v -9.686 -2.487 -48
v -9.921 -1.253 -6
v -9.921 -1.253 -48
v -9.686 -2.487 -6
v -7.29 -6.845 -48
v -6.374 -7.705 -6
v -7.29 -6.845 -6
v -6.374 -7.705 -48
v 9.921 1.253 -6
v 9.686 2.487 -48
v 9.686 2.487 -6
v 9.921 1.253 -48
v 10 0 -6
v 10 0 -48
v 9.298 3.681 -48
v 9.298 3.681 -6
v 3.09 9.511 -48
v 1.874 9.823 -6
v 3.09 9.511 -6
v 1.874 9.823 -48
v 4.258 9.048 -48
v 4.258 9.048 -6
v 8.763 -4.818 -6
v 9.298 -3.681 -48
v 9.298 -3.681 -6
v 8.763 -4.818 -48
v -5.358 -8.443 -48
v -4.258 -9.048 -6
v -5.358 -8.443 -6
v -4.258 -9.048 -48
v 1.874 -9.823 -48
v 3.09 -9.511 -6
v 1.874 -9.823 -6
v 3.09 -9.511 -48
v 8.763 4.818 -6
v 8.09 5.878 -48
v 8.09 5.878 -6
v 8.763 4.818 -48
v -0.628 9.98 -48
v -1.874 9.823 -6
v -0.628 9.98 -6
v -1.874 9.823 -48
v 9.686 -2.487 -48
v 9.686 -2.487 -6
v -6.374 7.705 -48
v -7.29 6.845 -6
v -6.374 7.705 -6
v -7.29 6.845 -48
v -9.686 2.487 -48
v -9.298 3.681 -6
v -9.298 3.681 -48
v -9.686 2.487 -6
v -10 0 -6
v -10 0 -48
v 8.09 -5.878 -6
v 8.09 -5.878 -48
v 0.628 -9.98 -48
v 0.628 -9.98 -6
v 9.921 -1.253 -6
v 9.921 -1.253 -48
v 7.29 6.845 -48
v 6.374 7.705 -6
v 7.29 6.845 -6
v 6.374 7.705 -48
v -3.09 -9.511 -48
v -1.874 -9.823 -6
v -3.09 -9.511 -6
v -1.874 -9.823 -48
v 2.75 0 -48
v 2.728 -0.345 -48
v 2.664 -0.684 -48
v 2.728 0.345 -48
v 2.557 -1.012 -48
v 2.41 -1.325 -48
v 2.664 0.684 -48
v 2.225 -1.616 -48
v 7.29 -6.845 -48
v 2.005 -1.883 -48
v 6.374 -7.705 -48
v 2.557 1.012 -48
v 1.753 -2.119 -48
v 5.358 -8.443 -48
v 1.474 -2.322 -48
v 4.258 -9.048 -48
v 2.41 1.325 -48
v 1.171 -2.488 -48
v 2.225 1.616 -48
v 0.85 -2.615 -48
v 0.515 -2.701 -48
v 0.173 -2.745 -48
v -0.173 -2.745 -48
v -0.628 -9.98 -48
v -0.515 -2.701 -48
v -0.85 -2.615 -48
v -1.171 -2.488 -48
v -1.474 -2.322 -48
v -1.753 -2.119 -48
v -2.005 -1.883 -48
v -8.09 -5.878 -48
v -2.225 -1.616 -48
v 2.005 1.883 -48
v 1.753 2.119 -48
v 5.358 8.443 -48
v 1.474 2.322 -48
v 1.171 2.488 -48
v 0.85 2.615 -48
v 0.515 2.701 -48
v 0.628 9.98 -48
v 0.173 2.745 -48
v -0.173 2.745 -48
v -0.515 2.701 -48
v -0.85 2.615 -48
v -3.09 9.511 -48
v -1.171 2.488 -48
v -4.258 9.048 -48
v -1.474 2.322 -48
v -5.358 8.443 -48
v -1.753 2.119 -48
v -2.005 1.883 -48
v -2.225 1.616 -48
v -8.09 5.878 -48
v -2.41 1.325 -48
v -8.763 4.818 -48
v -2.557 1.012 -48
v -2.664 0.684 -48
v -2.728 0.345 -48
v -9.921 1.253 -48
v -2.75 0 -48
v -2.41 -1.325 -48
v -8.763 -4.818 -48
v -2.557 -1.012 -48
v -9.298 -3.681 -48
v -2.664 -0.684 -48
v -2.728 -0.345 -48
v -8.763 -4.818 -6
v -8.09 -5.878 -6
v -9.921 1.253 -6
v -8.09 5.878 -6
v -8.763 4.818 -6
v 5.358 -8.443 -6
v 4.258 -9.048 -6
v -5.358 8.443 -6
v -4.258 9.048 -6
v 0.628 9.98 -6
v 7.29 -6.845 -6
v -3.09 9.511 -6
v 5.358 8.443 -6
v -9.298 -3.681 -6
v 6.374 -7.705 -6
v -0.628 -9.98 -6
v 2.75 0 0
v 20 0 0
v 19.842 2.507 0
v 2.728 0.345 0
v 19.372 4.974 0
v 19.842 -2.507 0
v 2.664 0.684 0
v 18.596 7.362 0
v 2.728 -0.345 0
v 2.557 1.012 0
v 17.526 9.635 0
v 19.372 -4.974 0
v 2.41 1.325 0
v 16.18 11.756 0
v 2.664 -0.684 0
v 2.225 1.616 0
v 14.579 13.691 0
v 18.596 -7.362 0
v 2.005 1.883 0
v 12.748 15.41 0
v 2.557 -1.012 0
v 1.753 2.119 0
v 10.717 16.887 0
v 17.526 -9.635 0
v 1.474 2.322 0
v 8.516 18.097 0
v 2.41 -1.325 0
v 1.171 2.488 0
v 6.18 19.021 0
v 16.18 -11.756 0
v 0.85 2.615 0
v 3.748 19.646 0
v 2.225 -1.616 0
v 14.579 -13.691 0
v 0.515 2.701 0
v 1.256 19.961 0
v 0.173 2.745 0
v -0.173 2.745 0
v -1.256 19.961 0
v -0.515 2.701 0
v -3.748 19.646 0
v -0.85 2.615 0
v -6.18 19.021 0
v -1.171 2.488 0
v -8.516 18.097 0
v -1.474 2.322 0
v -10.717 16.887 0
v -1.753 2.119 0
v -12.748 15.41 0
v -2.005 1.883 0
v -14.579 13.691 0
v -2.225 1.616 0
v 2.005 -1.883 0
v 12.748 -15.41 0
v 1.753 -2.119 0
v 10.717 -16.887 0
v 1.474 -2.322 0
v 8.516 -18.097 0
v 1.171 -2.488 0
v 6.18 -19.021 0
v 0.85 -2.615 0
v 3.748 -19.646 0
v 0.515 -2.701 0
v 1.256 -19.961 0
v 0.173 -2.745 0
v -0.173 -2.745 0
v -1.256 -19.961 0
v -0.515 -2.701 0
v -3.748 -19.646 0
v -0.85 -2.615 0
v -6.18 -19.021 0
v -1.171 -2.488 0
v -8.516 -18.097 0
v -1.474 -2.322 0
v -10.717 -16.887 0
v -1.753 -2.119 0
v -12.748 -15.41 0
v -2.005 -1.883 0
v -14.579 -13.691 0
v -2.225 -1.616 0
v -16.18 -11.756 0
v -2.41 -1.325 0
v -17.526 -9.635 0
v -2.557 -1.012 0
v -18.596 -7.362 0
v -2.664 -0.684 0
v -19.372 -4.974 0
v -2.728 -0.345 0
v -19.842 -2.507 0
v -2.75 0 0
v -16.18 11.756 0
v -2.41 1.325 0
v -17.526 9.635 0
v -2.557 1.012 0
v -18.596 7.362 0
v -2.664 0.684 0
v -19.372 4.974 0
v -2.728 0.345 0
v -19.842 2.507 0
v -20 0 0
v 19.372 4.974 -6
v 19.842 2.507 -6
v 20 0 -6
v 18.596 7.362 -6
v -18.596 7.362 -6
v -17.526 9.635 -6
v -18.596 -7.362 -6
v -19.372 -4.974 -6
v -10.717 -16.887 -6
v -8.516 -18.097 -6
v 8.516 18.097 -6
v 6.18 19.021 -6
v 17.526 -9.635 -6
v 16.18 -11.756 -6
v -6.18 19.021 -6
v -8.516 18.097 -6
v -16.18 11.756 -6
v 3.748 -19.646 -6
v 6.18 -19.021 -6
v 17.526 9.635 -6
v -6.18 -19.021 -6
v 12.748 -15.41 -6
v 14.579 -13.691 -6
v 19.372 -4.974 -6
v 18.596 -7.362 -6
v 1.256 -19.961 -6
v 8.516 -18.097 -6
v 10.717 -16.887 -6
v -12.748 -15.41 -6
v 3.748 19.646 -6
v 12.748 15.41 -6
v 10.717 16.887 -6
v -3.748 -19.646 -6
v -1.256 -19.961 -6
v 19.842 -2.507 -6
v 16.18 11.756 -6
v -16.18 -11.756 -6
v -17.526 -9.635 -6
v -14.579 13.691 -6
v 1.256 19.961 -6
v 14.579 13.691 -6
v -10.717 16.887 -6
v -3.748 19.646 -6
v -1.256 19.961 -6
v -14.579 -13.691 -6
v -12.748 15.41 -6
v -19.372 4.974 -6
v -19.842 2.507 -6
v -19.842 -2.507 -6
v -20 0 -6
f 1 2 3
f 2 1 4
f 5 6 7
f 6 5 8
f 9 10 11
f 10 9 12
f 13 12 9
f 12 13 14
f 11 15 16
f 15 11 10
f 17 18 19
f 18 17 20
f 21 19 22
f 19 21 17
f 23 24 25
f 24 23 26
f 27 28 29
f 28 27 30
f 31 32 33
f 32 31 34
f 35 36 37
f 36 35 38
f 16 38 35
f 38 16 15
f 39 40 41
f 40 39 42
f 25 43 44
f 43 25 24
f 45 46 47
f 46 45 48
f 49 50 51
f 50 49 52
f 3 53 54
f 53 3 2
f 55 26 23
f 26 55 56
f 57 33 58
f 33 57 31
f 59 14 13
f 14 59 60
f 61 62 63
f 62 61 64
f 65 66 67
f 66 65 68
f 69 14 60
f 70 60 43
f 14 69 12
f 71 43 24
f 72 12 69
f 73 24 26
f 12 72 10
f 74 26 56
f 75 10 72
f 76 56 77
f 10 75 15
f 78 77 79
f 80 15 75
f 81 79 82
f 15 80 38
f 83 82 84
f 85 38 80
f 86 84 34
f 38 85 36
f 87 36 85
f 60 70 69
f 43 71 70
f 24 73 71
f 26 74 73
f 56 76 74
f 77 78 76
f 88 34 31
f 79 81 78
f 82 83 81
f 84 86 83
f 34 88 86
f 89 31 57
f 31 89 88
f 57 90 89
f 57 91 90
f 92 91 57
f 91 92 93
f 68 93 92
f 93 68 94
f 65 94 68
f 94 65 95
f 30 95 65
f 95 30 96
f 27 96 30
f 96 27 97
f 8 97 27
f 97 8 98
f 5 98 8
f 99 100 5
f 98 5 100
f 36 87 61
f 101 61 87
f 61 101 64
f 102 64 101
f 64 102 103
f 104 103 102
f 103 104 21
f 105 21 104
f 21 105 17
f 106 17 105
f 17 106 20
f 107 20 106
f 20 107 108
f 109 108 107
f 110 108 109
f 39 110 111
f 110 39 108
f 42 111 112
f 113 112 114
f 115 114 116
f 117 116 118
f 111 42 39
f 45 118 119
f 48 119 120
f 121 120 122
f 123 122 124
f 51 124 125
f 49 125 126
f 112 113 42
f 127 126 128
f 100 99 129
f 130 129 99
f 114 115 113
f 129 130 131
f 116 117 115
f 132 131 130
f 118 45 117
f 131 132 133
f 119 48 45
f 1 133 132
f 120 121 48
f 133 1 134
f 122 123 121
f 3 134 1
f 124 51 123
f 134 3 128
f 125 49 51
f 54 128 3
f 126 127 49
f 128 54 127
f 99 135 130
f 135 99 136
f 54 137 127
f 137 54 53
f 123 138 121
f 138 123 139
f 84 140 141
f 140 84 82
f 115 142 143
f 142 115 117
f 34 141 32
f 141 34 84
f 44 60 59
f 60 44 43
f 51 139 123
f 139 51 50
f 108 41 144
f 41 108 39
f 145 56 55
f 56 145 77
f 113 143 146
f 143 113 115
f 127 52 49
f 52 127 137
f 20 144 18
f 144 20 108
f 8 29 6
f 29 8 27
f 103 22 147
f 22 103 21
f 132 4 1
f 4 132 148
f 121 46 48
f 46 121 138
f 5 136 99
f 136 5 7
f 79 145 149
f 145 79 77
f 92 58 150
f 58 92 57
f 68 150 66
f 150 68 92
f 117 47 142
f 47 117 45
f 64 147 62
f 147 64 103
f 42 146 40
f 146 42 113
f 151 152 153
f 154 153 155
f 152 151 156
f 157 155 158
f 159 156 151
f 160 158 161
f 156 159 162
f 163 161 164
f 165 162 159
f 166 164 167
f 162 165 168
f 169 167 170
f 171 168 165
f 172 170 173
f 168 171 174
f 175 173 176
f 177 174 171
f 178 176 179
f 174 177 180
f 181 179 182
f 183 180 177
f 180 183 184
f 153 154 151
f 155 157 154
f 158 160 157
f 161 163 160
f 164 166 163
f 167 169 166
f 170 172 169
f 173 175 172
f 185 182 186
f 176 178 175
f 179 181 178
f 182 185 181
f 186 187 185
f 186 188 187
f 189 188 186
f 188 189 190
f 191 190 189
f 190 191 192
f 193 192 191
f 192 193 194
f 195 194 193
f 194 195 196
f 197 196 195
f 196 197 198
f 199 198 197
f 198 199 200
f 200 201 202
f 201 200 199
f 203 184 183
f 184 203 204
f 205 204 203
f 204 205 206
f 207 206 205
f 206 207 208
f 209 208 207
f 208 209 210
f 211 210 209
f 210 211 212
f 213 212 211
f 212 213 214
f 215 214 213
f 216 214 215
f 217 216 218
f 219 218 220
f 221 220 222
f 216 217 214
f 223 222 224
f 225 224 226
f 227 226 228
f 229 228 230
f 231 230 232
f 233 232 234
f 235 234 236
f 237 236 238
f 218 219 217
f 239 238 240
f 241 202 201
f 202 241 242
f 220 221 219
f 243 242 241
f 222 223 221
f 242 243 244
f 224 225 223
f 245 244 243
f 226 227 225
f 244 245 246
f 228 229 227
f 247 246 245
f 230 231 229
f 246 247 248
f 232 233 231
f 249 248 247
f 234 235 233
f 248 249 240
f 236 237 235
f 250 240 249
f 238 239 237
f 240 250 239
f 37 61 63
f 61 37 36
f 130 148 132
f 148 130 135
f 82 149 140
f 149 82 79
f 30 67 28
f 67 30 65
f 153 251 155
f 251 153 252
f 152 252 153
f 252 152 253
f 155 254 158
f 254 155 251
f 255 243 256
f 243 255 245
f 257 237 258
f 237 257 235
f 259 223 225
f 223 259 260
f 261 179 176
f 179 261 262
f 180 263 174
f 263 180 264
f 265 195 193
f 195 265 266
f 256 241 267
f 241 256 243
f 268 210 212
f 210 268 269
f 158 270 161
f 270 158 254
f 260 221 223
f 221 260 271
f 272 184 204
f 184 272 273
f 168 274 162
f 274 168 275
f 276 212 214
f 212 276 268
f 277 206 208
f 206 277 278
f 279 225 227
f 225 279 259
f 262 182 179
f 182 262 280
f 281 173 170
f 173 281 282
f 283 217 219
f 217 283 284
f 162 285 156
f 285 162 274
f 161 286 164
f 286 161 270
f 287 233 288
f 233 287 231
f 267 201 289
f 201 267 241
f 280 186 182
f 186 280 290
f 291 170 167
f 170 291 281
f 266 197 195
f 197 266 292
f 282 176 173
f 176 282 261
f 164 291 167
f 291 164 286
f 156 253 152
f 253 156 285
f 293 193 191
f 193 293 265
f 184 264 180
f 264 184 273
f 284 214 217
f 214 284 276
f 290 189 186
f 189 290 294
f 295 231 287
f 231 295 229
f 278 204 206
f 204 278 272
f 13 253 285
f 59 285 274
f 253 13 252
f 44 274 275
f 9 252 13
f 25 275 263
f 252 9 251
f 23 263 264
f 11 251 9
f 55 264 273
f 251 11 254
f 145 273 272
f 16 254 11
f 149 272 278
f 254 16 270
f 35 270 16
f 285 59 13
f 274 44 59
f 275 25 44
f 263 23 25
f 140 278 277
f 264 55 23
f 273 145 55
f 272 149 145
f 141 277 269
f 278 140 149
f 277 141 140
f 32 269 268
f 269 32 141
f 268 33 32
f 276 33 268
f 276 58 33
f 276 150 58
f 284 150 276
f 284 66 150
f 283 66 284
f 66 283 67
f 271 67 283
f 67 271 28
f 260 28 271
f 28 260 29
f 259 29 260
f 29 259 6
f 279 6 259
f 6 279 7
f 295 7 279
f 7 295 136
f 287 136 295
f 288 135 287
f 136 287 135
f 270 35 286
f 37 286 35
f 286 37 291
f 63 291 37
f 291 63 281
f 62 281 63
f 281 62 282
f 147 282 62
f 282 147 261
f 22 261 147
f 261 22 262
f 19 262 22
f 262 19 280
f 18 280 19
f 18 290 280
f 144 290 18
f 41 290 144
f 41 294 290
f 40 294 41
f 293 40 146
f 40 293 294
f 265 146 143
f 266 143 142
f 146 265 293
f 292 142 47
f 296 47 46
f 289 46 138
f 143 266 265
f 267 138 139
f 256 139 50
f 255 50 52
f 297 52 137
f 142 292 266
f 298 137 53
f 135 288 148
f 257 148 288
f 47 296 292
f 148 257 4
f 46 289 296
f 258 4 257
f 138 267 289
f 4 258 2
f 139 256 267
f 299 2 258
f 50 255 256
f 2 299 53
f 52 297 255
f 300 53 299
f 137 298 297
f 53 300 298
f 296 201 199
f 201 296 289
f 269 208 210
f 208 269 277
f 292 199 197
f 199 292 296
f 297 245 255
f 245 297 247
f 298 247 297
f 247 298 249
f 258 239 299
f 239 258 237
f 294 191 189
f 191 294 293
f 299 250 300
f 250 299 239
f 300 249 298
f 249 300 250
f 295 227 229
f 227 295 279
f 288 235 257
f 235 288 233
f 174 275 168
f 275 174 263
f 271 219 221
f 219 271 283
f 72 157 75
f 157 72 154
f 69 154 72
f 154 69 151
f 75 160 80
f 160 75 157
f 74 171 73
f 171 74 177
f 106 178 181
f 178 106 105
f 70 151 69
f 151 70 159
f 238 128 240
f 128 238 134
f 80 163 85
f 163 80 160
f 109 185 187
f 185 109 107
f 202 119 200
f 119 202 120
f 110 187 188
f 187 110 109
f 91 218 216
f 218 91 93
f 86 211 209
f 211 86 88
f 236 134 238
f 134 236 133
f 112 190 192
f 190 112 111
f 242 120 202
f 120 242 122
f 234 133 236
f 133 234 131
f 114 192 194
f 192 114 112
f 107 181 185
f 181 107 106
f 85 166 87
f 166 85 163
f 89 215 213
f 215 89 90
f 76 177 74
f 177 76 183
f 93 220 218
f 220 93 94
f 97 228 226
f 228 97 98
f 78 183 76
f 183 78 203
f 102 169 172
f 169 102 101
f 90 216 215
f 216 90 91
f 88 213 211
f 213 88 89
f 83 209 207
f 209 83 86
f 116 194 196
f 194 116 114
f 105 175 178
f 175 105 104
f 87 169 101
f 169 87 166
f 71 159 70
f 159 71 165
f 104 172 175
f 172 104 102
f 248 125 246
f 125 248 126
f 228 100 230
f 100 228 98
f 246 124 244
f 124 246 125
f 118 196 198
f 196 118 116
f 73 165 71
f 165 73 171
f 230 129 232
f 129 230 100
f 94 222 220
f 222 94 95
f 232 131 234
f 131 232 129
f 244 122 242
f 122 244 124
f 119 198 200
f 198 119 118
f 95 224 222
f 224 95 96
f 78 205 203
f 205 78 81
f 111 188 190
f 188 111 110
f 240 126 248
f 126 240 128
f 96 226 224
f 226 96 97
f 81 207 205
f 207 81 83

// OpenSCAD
$fn = 50;


difference() {
	union() {
		translate(v = [0, 0, -48.0000000000]) {
			cylinder(h = 48, r = 10.0000000000);
		}
		translate(v = [0, 0, -6.0000000000]) {
			cylinder(h = 6, r = 20.0000000000);
		}
	}
	union() {
		#translate(v = [0, 0, -48]) {
			cylinder(h = 48, r = 2.7500000000);
		}
	}
}
